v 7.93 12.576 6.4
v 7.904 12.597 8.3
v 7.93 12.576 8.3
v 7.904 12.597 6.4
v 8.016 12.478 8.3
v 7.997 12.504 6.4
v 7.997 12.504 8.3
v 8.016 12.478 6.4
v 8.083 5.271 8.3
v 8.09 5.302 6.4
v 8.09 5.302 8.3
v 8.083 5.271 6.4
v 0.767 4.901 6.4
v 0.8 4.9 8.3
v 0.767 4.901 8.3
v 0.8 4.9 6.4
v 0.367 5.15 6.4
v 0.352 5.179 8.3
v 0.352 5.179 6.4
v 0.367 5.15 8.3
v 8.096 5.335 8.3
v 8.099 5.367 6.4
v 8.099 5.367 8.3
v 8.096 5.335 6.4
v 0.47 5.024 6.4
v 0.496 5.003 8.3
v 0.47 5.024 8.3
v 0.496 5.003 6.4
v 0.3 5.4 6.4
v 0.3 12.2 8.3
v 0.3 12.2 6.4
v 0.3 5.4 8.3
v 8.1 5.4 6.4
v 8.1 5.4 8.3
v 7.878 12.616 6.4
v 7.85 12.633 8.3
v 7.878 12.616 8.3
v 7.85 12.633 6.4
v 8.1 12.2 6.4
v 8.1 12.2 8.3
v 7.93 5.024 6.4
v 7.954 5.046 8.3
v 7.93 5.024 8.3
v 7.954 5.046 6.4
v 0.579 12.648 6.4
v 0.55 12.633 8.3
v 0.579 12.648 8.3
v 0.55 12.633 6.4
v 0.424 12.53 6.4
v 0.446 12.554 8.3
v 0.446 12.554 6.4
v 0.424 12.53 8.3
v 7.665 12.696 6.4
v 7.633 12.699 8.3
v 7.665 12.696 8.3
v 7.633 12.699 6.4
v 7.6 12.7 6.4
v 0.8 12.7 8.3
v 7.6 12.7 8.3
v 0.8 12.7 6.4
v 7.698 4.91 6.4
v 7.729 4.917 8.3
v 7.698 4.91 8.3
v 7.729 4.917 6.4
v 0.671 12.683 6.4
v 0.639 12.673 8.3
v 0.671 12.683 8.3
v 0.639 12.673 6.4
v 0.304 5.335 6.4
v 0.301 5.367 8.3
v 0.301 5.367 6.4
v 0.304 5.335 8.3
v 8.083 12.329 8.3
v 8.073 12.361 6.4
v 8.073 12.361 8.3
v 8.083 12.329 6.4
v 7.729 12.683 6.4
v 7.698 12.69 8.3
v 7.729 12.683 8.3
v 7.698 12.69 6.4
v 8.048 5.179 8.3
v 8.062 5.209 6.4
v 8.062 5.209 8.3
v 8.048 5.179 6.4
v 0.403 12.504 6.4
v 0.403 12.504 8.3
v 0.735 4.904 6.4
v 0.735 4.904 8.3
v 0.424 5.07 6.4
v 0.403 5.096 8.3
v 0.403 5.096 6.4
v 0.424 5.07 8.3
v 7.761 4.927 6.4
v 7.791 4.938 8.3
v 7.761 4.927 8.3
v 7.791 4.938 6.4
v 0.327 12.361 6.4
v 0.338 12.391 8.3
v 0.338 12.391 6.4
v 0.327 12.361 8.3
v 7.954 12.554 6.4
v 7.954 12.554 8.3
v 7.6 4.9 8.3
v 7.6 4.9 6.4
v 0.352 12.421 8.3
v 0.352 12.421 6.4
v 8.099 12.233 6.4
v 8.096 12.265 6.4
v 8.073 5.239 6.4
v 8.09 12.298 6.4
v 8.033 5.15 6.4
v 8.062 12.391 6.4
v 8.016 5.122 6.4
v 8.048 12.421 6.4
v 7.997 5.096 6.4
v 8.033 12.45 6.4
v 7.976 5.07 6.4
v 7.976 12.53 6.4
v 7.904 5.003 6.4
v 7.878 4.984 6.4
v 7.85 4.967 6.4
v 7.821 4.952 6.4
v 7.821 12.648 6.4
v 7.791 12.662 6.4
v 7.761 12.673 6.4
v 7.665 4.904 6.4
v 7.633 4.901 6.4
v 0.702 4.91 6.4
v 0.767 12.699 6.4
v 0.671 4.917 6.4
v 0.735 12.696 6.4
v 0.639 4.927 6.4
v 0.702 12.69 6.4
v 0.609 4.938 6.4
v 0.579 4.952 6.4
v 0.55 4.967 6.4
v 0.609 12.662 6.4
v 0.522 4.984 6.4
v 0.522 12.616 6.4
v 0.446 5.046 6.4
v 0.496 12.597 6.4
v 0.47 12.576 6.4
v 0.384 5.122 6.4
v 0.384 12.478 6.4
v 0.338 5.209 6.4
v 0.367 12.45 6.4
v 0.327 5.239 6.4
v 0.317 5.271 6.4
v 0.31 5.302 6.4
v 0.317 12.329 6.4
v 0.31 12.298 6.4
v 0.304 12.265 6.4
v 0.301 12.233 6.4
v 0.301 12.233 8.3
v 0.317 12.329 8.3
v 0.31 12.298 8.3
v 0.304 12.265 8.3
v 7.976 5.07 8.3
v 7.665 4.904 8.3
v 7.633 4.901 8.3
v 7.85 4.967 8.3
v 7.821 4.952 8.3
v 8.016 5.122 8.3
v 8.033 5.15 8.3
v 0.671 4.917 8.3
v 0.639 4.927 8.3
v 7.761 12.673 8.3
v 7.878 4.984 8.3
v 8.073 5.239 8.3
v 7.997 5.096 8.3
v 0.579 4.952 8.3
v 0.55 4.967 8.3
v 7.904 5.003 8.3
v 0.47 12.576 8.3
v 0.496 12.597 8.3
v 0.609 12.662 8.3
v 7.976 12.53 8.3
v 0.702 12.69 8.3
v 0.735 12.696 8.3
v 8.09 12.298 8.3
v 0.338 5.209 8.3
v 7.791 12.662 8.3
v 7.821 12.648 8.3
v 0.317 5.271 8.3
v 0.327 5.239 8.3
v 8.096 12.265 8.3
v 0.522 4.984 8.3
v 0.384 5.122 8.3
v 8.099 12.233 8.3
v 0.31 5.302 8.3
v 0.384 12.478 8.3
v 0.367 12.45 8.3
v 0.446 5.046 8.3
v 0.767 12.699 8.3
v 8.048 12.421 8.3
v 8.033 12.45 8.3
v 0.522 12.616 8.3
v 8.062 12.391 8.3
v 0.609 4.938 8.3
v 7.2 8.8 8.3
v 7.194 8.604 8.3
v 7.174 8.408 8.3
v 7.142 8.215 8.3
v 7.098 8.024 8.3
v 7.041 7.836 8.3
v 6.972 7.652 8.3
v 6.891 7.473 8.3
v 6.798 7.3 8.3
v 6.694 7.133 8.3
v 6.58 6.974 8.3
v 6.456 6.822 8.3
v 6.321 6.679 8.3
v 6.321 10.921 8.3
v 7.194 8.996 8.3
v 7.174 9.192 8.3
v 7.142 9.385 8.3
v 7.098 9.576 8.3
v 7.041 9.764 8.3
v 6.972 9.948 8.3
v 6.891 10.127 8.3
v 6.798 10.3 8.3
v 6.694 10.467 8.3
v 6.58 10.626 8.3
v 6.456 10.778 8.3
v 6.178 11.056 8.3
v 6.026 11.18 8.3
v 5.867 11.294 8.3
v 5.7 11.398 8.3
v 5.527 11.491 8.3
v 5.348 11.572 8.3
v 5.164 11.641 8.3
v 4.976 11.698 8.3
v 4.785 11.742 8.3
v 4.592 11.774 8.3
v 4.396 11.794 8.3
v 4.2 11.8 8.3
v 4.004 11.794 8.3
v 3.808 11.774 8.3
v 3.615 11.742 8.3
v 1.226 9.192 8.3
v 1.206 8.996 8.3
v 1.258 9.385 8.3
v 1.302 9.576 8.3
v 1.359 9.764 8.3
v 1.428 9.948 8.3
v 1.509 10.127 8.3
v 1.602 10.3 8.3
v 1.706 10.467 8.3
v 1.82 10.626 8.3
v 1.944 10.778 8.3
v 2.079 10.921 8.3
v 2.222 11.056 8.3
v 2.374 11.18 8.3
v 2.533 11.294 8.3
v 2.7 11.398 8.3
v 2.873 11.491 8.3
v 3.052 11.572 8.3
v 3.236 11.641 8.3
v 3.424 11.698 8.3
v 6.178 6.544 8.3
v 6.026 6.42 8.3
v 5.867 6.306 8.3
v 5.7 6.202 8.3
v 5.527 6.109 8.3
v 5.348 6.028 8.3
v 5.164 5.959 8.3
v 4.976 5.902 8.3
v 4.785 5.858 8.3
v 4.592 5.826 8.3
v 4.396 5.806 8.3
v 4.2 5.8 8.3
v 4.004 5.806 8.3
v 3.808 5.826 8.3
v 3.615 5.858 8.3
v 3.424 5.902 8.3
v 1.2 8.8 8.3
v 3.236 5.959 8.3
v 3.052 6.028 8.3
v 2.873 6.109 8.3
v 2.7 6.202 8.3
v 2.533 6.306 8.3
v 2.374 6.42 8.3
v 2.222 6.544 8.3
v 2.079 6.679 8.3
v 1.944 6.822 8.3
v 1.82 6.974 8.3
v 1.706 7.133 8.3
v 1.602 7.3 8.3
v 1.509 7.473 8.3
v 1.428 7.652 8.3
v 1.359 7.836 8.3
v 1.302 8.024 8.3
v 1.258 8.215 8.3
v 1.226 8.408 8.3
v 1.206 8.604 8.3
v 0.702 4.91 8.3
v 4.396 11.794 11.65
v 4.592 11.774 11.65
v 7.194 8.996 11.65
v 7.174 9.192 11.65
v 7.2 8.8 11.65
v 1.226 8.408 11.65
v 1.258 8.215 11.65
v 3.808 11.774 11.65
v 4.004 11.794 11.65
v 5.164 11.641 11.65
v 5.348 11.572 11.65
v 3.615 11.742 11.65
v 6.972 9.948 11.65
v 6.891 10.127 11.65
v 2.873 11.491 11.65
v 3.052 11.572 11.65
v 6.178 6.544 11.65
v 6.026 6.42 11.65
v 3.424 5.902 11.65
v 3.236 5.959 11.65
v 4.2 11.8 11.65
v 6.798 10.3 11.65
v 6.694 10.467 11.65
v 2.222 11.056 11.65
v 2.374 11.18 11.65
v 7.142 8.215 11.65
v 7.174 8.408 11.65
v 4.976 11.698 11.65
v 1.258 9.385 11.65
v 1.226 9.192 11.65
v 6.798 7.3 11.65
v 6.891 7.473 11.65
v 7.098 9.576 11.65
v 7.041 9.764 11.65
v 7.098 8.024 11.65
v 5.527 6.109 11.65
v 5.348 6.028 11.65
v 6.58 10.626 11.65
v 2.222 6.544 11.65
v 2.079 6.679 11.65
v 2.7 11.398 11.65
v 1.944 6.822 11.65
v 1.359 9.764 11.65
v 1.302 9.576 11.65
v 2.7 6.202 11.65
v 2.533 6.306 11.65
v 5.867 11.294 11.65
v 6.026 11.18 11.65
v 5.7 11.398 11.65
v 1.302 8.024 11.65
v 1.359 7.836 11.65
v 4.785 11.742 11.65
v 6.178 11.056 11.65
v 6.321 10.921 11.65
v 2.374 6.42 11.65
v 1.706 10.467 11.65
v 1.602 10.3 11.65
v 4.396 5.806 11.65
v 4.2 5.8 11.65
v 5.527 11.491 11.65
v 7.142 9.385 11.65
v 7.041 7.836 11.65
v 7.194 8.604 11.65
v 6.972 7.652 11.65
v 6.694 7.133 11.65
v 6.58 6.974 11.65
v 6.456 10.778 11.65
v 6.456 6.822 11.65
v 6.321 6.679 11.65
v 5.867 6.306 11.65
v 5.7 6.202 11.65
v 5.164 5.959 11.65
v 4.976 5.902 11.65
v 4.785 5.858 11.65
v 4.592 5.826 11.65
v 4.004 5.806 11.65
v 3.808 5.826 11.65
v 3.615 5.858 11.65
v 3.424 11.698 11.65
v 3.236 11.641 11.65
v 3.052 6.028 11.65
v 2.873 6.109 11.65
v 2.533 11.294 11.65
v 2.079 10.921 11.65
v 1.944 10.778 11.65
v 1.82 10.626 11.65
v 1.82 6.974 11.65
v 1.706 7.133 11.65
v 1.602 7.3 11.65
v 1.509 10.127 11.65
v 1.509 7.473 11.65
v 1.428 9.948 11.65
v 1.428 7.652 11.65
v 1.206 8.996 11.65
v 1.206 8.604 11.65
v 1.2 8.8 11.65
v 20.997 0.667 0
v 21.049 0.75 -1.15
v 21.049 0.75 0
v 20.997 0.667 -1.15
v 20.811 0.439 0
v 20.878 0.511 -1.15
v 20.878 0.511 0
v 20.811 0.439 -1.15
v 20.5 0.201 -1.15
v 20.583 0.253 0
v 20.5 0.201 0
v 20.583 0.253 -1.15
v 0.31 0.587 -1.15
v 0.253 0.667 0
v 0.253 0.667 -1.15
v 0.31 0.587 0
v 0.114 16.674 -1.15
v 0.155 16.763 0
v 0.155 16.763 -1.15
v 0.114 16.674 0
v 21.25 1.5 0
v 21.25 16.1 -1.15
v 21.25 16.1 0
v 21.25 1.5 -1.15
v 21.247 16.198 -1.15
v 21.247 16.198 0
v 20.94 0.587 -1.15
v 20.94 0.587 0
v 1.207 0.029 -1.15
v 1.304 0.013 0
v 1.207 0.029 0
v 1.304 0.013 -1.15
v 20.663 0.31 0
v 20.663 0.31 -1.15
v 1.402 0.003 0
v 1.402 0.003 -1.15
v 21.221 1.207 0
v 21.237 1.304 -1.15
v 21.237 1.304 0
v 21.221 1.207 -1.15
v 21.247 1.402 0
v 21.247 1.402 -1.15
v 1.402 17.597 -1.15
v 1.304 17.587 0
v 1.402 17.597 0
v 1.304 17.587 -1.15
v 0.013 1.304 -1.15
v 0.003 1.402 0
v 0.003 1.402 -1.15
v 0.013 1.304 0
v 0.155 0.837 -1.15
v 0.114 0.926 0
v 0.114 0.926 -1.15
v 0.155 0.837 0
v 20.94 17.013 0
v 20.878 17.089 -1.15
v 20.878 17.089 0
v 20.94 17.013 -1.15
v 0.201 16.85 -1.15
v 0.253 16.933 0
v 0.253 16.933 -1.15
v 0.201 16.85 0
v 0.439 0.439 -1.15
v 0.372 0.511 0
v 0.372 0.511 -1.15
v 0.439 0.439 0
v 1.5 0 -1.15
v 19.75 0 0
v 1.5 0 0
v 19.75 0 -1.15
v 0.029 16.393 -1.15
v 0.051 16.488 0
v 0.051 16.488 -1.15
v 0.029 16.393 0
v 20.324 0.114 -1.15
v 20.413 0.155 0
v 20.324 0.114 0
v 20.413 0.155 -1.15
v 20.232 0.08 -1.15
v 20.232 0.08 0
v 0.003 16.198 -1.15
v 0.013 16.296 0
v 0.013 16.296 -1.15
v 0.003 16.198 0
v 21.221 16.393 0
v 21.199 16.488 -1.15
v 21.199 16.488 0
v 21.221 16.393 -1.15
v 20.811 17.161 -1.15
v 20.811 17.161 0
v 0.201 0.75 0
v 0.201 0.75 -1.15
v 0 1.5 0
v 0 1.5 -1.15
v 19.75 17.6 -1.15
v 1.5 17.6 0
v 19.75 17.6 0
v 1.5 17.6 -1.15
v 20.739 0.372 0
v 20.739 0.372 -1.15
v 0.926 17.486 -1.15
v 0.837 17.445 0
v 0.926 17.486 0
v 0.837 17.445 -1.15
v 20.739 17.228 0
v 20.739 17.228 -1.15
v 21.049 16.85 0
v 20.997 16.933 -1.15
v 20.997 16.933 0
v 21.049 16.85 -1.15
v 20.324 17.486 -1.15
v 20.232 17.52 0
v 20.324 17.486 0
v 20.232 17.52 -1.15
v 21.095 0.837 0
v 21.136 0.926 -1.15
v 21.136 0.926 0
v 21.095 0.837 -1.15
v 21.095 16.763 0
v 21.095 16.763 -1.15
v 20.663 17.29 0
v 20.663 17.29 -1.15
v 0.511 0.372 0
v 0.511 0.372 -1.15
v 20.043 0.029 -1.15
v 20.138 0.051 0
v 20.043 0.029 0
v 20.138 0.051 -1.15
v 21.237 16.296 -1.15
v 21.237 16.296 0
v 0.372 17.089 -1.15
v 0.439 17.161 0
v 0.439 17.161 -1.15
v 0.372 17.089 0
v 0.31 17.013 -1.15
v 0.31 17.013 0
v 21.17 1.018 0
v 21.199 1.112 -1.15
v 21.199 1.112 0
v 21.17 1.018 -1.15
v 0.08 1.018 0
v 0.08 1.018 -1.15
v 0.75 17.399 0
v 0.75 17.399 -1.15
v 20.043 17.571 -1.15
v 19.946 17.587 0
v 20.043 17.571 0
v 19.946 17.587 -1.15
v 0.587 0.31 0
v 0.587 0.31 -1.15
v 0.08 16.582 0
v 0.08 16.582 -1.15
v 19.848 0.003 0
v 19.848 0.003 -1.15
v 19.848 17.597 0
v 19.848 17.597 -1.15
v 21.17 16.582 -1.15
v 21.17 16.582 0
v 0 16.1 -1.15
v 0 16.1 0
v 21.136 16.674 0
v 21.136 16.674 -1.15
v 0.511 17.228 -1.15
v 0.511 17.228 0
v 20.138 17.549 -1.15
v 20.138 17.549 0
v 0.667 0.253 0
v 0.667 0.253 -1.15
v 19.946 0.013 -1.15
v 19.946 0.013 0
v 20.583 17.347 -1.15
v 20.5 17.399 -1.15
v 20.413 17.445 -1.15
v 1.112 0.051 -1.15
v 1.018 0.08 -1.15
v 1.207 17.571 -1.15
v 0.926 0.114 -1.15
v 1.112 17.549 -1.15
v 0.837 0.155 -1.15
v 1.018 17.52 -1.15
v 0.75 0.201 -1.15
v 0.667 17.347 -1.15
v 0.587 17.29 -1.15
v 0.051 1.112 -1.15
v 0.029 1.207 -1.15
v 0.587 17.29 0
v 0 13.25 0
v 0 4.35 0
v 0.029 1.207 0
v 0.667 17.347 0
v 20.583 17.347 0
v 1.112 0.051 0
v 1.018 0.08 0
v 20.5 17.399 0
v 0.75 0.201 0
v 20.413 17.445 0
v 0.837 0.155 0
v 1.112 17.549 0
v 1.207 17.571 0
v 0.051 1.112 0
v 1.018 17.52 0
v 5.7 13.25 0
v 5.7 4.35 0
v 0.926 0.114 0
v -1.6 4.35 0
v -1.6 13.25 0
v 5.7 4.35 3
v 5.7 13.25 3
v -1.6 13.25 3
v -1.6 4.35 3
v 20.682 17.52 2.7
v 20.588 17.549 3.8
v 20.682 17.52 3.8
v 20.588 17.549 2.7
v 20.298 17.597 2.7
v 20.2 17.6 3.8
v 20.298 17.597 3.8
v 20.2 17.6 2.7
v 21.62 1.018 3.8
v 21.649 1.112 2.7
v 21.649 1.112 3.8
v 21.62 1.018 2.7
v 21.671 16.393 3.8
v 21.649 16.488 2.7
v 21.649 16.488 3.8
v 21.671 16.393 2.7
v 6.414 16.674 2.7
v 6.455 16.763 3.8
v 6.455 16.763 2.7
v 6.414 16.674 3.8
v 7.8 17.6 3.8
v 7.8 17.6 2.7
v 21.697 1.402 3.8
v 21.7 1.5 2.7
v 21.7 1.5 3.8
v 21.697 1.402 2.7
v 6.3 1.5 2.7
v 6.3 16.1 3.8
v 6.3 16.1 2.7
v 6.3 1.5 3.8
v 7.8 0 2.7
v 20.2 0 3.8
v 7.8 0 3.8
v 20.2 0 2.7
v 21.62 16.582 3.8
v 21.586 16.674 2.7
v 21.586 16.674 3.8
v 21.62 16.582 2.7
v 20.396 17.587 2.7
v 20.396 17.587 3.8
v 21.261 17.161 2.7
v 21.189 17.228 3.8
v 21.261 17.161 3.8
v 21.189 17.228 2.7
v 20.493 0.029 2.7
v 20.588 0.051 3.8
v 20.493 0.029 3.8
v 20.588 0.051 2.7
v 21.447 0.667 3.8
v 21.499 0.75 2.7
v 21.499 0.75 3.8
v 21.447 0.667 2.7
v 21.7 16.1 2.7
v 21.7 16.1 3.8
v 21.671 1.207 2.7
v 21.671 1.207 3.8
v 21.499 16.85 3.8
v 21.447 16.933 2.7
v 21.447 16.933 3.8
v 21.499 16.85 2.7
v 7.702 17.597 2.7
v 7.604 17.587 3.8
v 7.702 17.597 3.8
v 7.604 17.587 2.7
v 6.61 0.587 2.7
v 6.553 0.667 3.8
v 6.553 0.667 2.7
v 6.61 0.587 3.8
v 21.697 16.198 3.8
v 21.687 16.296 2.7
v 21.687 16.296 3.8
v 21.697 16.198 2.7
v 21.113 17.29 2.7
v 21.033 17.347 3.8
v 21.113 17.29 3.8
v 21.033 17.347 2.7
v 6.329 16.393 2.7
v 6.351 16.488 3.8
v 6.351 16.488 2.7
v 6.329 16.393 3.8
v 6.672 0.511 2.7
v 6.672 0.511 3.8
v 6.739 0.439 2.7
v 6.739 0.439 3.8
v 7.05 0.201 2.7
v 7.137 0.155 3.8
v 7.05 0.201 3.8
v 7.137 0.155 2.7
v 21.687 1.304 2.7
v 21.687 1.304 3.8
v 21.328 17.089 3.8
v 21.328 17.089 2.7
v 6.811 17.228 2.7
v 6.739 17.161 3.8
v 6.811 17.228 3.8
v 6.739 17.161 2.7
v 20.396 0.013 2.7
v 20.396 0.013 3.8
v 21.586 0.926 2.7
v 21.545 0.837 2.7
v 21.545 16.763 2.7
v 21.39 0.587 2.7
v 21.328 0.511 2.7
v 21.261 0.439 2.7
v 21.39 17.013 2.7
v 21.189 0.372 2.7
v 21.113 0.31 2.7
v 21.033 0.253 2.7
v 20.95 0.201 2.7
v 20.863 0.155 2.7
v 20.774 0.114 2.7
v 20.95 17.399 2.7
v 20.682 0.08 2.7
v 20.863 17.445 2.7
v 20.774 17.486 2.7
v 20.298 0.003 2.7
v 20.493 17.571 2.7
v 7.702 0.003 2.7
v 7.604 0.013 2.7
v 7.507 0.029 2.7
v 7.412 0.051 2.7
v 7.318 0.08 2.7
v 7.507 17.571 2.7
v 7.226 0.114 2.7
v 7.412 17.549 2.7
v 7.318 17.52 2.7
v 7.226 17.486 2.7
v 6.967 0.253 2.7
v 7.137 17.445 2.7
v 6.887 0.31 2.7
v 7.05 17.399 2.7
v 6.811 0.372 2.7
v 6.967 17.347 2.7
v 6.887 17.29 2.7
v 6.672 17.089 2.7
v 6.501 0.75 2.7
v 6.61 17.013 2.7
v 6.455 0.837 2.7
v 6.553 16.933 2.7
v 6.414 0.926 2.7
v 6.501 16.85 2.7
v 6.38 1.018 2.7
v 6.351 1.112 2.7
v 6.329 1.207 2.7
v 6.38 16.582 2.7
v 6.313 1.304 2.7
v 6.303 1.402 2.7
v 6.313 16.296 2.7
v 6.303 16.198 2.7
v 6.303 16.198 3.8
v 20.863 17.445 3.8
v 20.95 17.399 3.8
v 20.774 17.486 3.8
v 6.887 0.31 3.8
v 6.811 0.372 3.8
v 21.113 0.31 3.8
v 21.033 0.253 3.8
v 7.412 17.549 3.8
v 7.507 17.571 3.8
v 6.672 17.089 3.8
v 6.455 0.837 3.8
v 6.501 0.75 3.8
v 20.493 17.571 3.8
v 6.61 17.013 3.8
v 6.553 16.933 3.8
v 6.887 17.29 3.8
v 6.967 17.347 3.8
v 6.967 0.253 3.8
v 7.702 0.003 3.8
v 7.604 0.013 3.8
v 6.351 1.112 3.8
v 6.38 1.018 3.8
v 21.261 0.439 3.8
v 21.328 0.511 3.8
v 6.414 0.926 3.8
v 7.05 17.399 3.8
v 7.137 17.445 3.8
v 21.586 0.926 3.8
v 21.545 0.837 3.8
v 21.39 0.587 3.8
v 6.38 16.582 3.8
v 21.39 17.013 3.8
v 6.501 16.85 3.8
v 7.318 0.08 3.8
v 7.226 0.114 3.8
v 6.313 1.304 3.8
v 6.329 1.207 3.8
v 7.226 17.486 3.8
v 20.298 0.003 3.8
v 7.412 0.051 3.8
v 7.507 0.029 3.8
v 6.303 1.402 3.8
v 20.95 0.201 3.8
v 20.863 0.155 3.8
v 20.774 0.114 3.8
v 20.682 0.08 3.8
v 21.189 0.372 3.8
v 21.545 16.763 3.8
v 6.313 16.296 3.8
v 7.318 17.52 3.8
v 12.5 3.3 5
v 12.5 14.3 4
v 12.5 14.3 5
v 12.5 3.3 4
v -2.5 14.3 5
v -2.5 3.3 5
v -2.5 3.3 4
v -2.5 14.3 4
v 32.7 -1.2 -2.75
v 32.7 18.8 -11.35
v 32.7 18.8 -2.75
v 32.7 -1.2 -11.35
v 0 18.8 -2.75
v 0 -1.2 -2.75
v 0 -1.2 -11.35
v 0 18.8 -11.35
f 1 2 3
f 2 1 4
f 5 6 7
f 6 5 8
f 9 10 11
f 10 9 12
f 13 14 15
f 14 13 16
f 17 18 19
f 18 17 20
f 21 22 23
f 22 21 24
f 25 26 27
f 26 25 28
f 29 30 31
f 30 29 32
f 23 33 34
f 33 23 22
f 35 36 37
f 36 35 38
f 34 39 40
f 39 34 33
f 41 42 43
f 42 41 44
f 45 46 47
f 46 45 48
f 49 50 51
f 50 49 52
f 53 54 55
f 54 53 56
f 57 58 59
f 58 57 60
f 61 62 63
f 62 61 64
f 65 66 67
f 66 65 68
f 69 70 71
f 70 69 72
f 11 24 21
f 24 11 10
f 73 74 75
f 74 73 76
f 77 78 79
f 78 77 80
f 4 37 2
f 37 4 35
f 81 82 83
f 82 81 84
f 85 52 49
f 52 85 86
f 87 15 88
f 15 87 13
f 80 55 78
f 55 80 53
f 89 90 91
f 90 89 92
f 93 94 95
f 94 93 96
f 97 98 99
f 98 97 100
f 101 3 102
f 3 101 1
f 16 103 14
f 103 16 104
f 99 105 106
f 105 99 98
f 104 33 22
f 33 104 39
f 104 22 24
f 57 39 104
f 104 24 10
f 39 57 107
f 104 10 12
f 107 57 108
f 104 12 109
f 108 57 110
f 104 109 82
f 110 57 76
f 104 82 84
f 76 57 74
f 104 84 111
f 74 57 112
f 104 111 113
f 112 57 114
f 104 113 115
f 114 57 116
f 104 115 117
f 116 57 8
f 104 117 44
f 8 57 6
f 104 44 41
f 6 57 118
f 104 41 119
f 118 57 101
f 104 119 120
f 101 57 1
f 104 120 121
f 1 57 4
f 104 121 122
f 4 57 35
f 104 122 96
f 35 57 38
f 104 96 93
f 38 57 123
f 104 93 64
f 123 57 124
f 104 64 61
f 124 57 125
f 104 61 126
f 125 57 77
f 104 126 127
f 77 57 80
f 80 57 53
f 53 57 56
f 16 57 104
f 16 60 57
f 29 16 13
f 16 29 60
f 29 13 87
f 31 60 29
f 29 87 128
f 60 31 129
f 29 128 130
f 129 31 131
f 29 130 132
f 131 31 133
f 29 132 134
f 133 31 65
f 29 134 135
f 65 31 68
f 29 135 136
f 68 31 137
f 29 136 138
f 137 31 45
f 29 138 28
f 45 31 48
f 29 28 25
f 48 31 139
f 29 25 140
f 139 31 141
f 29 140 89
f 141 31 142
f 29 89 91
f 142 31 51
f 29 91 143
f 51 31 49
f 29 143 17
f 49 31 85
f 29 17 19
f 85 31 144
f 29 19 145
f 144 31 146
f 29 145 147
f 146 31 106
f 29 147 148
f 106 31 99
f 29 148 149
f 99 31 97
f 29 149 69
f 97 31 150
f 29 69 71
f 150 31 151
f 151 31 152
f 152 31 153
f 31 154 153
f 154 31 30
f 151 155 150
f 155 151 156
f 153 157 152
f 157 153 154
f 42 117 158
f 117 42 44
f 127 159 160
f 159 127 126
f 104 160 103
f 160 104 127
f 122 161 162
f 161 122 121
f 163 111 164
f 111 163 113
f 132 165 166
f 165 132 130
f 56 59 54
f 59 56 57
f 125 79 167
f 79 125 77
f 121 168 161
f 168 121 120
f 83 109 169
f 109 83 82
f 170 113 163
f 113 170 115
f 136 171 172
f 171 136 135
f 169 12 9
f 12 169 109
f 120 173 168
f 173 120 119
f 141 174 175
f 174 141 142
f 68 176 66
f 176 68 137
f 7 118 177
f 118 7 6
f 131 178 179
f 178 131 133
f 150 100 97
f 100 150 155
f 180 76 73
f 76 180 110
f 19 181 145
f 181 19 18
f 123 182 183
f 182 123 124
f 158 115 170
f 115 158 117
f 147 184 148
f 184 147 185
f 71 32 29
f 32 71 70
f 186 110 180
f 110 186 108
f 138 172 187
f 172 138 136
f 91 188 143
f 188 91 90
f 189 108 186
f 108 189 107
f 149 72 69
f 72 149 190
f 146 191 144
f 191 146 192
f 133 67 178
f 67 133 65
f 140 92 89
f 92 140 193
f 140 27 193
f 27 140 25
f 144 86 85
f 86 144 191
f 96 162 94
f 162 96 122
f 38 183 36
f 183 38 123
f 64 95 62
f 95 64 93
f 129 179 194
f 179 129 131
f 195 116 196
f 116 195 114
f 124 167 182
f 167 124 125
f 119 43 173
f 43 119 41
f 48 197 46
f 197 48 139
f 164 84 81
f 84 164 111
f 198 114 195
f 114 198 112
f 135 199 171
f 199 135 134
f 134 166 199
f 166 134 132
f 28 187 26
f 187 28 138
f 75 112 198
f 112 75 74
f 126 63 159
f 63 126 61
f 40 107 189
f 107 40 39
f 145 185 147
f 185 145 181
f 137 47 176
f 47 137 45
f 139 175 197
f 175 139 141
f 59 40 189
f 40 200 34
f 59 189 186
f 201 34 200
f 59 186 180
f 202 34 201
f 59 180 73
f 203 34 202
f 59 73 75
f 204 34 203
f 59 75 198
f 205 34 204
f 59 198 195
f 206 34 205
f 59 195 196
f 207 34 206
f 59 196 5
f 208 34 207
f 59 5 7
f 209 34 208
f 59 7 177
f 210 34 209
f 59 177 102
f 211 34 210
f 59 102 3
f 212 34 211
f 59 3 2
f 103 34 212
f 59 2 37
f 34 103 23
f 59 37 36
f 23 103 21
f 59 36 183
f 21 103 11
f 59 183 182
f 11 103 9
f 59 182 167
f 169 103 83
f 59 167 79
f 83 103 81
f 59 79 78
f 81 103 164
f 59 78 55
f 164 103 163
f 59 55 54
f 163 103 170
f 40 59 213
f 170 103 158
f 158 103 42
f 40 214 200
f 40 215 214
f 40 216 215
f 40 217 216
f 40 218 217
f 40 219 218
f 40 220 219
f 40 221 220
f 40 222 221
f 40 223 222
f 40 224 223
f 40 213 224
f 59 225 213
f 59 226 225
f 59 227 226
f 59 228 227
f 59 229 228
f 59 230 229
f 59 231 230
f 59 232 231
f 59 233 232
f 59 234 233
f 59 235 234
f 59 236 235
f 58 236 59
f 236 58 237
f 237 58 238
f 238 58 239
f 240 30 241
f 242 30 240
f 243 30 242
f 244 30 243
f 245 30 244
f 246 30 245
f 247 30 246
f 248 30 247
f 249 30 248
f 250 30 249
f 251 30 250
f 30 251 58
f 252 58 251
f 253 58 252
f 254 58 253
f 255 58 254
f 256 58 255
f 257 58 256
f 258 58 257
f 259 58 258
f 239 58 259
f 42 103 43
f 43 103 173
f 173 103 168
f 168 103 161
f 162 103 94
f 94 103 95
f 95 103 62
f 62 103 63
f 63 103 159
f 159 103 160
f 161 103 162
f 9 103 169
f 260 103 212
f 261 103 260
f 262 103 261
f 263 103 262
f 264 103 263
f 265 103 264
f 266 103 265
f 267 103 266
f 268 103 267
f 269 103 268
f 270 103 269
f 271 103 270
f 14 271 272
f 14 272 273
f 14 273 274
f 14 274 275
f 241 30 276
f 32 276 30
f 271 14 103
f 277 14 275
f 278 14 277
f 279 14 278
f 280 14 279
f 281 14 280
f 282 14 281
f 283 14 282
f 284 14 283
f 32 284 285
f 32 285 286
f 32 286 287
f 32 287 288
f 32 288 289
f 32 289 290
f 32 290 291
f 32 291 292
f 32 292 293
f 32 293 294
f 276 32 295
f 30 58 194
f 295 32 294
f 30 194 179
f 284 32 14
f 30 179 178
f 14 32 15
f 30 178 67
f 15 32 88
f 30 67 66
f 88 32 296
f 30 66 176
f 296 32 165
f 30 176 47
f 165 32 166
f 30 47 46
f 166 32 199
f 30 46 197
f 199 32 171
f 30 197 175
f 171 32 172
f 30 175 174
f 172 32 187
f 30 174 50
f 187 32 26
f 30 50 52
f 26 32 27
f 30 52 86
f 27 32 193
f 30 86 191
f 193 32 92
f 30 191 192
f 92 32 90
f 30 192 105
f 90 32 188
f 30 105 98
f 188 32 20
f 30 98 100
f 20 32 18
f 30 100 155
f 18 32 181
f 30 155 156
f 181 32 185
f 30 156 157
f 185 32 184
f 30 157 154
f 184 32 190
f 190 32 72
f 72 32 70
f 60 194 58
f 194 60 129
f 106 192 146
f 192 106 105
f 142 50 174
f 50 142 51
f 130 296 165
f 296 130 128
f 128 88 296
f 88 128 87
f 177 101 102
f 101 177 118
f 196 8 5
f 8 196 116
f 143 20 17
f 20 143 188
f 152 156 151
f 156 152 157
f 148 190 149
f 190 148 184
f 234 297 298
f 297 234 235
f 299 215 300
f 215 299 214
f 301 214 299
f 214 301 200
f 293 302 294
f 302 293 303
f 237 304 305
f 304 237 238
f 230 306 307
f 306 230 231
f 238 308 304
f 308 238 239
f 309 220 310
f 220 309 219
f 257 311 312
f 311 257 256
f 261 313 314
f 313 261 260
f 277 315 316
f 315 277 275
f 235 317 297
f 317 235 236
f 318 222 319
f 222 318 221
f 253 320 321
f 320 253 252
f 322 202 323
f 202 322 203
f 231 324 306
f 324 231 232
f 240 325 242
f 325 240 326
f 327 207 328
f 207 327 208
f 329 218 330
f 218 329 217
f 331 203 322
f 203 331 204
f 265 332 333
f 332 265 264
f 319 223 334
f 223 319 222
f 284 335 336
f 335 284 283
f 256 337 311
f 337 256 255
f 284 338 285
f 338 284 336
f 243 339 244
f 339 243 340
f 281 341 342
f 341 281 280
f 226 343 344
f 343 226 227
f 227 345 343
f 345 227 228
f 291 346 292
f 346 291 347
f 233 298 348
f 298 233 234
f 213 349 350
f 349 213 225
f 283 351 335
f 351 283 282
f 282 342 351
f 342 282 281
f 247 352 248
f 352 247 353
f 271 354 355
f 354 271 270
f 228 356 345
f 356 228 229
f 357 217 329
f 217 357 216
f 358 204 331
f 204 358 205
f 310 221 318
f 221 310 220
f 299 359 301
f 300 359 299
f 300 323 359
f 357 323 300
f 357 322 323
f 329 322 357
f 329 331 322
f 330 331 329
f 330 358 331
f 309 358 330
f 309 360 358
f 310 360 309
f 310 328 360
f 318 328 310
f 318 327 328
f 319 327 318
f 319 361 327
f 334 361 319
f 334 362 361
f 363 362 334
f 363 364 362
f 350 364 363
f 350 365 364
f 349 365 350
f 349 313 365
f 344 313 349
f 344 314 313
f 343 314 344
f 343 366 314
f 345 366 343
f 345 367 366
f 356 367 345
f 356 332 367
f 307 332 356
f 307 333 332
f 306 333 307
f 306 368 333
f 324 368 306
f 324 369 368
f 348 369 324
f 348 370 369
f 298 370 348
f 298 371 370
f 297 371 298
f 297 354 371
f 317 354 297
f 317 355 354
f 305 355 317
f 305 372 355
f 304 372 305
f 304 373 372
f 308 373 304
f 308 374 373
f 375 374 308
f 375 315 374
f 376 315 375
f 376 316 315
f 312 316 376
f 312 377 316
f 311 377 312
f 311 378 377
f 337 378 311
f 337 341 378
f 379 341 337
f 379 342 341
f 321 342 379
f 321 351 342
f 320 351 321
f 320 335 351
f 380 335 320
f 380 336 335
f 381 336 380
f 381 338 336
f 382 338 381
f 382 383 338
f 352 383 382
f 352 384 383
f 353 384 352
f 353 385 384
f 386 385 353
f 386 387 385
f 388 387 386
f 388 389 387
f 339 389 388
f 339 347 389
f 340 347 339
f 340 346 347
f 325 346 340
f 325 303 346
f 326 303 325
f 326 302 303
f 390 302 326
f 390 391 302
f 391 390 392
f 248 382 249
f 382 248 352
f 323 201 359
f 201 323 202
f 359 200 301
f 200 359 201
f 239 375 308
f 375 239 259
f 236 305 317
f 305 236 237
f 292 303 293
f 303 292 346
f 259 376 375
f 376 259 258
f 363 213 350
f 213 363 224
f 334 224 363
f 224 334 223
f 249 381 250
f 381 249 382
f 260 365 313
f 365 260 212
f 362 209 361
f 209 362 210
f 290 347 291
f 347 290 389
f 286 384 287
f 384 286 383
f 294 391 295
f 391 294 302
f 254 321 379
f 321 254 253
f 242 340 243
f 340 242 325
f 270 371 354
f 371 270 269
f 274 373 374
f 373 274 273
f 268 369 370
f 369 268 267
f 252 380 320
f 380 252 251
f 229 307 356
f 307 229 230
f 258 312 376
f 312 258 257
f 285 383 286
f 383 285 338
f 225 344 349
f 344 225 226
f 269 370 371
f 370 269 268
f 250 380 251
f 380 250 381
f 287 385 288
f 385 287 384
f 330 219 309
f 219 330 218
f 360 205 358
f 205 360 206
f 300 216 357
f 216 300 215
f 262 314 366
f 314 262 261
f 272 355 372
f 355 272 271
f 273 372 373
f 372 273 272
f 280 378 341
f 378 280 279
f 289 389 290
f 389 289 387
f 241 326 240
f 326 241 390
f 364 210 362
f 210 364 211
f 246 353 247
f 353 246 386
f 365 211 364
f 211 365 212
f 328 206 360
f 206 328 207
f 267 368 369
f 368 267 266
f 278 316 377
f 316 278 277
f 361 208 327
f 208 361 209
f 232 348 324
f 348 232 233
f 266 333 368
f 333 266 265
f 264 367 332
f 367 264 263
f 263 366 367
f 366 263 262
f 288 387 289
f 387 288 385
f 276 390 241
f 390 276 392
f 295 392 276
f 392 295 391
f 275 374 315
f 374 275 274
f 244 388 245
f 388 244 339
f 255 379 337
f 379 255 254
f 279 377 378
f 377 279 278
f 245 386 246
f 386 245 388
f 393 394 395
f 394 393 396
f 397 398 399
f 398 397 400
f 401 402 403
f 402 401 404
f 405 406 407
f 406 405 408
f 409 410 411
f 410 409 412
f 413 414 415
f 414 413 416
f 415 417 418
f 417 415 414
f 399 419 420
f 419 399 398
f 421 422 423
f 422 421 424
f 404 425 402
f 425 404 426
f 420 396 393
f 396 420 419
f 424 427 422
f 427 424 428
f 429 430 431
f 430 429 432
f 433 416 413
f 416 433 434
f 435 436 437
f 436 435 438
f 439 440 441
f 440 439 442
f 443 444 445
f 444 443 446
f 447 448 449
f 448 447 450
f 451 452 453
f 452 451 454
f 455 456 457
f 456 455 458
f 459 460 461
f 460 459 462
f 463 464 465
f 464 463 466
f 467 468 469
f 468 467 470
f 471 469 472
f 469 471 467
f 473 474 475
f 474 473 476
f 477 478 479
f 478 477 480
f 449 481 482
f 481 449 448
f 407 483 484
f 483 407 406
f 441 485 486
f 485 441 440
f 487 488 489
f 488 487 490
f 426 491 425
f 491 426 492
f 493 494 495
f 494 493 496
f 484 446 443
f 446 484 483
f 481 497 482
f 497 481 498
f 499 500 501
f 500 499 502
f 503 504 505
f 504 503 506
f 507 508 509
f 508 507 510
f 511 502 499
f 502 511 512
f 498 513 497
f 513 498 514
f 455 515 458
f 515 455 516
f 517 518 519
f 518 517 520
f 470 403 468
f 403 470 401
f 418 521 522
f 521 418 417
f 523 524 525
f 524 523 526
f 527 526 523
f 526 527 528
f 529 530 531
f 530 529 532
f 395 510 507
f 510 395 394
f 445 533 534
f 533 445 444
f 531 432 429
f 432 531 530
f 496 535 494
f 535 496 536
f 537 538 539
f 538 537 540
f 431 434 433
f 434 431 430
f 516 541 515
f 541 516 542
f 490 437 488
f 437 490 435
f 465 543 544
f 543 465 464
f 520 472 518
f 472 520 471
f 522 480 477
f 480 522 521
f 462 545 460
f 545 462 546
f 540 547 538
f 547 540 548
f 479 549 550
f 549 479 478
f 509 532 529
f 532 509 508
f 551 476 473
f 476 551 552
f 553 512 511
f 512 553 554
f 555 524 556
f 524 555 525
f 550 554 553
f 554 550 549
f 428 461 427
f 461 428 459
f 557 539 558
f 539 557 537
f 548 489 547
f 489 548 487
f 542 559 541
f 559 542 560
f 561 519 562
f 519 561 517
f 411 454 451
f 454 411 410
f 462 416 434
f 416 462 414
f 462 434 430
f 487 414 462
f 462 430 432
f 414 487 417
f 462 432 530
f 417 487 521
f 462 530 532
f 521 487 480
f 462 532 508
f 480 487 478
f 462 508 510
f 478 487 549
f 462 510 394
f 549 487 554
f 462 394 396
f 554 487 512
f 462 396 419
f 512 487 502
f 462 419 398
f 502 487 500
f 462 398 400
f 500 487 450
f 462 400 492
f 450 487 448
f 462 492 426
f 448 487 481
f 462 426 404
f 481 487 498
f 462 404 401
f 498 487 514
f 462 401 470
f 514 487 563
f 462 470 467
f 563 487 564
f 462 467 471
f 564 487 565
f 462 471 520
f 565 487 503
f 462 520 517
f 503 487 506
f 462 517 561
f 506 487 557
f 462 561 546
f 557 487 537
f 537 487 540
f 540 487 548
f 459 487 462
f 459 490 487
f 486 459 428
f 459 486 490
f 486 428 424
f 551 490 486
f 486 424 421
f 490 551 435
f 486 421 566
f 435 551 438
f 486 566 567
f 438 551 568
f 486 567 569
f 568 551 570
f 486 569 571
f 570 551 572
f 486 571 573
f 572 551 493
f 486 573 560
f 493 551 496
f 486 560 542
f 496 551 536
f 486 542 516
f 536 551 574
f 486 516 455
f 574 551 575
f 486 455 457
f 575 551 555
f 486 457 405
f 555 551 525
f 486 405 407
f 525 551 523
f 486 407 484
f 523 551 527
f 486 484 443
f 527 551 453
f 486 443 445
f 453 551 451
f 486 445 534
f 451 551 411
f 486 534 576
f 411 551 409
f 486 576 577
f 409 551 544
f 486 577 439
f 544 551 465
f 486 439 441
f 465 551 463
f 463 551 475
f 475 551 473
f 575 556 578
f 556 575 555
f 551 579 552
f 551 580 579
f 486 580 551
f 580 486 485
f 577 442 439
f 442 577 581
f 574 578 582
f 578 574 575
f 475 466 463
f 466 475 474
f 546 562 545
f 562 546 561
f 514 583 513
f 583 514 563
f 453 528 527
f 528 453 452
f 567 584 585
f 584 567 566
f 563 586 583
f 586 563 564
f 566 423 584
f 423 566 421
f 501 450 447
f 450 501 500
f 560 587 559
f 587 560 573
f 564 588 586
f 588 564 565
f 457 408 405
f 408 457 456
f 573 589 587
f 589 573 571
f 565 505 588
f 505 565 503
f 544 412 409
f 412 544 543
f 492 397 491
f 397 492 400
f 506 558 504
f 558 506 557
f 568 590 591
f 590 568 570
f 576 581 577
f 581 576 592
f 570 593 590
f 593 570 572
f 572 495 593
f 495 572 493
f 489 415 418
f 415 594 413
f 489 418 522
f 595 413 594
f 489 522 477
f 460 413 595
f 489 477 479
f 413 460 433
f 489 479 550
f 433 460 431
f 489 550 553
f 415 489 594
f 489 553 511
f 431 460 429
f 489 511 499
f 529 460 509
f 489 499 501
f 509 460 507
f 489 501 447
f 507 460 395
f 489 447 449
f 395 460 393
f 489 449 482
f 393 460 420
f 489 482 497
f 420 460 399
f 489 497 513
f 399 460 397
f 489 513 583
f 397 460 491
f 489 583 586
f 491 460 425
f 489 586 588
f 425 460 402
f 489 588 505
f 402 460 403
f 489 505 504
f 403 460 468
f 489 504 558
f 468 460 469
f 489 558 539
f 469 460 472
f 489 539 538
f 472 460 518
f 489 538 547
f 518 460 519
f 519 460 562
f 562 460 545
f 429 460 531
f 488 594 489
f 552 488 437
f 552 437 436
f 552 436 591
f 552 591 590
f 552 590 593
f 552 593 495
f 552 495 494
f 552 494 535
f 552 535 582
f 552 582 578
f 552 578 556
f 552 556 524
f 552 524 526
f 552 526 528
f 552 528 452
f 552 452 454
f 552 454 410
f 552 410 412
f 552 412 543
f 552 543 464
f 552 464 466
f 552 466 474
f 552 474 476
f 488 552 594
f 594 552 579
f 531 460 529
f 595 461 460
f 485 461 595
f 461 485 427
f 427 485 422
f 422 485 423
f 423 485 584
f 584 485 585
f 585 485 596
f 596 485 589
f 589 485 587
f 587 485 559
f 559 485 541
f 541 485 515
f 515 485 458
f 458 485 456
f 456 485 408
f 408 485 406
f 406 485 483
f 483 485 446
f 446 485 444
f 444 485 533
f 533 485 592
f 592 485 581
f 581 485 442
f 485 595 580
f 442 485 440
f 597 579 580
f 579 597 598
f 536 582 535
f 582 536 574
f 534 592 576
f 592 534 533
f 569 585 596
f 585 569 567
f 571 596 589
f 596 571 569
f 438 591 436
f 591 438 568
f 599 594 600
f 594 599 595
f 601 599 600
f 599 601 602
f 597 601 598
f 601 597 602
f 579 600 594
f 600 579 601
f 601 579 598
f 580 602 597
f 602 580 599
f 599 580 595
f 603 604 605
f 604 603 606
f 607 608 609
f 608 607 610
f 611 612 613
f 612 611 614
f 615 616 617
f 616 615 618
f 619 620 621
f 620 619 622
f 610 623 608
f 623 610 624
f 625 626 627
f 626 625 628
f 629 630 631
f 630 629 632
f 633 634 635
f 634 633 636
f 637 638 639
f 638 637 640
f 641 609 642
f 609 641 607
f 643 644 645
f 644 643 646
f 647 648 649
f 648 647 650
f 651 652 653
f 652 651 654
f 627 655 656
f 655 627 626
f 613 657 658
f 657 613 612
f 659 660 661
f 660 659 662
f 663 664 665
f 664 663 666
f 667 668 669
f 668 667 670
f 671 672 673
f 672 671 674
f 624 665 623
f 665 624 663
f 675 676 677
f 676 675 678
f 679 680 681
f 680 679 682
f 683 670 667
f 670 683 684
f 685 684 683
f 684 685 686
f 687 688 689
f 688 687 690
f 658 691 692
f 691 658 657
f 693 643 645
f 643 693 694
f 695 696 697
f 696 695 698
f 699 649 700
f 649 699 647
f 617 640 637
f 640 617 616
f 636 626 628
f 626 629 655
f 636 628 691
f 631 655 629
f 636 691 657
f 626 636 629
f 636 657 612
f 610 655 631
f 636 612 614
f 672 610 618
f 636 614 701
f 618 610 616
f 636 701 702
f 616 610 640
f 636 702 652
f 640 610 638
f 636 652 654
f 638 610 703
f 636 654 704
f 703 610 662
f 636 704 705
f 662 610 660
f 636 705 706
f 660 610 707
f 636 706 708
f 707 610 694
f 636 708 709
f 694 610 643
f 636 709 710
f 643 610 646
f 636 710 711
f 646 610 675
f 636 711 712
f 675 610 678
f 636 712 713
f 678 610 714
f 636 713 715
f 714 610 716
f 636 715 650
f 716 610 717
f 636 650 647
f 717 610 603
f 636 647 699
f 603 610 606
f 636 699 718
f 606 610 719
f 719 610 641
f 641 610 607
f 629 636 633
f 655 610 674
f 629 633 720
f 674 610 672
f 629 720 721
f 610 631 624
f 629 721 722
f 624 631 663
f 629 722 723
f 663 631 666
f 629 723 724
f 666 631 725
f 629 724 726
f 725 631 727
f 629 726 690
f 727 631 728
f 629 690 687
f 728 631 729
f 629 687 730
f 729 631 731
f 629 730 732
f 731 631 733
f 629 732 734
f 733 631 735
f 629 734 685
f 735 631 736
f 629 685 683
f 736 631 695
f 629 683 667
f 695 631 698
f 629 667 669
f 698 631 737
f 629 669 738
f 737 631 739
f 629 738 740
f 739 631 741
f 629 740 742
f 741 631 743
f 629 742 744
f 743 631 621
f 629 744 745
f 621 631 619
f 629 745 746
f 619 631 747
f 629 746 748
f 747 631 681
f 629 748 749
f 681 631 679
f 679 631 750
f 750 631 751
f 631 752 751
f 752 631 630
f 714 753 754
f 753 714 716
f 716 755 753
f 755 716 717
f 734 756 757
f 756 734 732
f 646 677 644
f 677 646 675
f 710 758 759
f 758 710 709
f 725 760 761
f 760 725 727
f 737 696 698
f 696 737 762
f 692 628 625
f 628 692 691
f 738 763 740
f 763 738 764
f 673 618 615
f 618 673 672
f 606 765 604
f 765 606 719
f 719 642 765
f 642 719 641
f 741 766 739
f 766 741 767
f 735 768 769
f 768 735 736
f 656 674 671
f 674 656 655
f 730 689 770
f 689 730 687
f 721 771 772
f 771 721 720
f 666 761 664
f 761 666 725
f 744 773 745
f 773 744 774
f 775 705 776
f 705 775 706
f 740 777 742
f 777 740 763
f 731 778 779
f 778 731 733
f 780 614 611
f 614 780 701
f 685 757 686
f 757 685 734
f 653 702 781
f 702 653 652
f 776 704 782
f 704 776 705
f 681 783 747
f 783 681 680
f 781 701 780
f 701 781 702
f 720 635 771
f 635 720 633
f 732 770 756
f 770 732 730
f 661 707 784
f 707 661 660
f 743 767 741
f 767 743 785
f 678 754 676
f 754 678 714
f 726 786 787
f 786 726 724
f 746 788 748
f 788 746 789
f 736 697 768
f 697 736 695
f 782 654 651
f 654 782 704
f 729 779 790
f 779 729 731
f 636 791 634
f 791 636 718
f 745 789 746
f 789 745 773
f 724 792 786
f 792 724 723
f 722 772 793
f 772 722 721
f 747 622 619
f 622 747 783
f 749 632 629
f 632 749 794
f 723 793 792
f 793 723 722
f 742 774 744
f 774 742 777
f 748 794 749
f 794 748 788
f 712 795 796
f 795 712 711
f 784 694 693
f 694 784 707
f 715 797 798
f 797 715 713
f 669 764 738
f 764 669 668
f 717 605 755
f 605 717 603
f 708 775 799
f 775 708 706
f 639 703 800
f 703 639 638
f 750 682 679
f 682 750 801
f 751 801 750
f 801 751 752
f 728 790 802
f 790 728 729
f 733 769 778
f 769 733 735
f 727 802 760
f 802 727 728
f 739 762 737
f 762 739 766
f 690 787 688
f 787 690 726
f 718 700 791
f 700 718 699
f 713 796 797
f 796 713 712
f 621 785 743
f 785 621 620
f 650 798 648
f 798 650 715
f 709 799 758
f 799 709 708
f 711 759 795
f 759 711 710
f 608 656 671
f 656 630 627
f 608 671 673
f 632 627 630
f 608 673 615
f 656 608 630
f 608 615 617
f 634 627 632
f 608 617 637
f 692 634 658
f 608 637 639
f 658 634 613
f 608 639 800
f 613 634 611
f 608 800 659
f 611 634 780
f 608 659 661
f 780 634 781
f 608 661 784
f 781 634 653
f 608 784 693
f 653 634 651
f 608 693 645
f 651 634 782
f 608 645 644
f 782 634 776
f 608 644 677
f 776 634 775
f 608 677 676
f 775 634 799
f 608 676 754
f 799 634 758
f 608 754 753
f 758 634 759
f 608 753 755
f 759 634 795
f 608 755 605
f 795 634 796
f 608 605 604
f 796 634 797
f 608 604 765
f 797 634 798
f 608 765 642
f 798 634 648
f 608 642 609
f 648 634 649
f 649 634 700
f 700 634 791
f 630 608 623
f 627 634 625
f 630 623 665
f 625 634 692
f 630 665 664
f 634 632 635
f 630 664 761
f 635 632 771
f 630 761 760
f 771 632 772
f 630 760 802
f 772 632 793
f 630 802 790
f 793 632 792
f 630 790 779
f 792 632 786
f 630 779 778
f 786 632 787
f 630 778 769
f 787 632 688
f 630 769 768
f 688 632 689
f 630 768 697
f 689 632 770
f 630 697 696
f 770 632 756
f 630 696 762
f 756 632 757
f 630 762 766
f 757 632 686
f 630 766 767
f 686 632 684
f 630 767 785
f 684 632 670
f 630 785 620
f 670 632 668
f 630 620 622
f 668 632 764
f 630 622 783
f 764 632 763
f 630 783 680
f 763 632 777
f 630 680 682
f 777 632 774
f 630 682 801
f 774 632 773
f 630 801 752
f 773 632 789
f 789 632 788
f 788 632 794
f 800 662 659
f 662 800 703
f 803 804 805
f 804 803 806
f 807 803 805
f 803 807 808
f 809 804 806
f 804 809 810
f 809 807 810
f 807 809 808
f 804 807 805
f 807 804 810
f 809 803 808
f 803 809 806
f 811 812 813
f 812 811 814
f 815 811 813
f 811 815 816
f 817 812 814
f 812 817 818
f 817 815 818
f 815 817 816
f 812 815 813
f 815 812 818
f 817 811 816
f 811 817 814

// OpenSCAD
// file: params.scad
// envsense クリップ筐体 — パラメータ定義 (Phase 1 / #2)
//
// 値の単一ソースは dimensions.md。ここの「実測値」変数名は dimensions.md の
// 「OpenSCAD 変数名」列と完全一致させること（hardware/CLAUDE.md の規約）。
//
// 座標系（dimensions.md の規約に準拠）:
//   原点  = XIAO メイン基板の USB-C 側短辺の角
//   +X    = 基板長手方向（USB-C 端 → 反対端）, 0..board_l
//   +Y    = 基板幅方向, 0..board_w
//   +Z    = 厚み方向。z=0 はメイン基板の上面（USB-C 側）。
//           +Z = 上面（USB-C 側）/ -Z = 下面（Sense 拡張ボード・カメラ側）
//
// 「実測値」と「はめ合い後の値(_fit)」は分離する。実測は素のまま、
// クリアランスはここで足す（dimensions.md の測定ルール）。

// ===== 1. XIAO ESP32S3 メイン基板（実測値） =====
board_l      = 21.25;   // 基板 長さ
board_w      = 17.6;    // 基板 幅
pcb_t        = 1.15;    // PCB 厚み
corner_r     = 1.5;     // 角 R
usb_overhang = 1.6;     // USB-C コネクタの基板からの飛び出し（実測; 全長7.3 - 載り5.7。旧0.85を置換）
usb_w        = 8.9;     // USB-C コネクタ 幅
usb_h        = 3.0;     // USB-C コネクタ 高さ（筐体内 最高部品）
usb_open_w   = 8.3;     // USB-C 開口 幅（受け口 実測）
usb_open_h   = 2.5;     // USB-C 開口 高さ（受け口 実測）
usb_z        = 0.2;     // USB-C 開口 下端の基板上面からの高さ
top_clr      = 3.0;     // 上面 最大部品高さ（= usb_h）
pin_pitch    = 2.54;    // ピン ピッチ（規格）

// ===== 2. Sense 拡張ボード（実測値, ローカル原点） =====
sense_l     = 15.4;     // 外形 長さ
sense_w     = 17.6;     // 外形 幅
sense_t     = 1.1;      // PCB 厚み
b2b_gap     = 2.7;      // B2B コネクタ高さ（基板間の隙間）
mic_xy      = [6.6, 2]; // PDM マイク穴 位置（拡張ボード ローカル）
cam_fpc_xy  = [8.8, 9]; // カメラ FPC コネクタ 位置（拡張ボード ローカル）
sd_protrude = 2.5;      // SD カード挿入時の頭(-X)突き出し: 先端 x = -2.5（基板頭 x=0 基準, 実測）
                        //   旧記載「埋め込み式 0」は誤り。USB 前面(x=-1.6)よりさらに 0.9mm 出る

// ===== 3. 合体状態（実測値） =====
assy_h      = 7.8;          // 合体時 総厚（カメラ除く）
assy_offset = [6.3, 0];     // 拡張ボードの主基板に対するズレ X/Y

// ===== 4. OV3660 カメラモジュール（実測値） =====
cam_l    = 7.8;             // カメラ基板 長さ
cam_w    = 7.8;             // カメラ基板 幅
cam_t    = 1.9;             // カメラ基板 厚み
lens_d   = 6;               // レンズホルダー外径（= 前面レンズ穴径の基準）
lens_h   = 3.35;            // レンズホルダー突き出し高さ
lens_xy  = [3.9, 3.9];      // レンズ光軸（カメラ基板中心からのオフセット）
fpc_w    = 6;               // FPC 幅
fpc_l    = 8.7;             // FPC 長さ

// ===== 5. バッテリー（実測値） =====
bat_l       = 32.7;         // セル本体 長さ（基板長 21.25 より長い → レイアウト注意）
bat_w       = 20;           // セル本体 幅
bat_t       = 7.6;          // セル本体 厚み（最厚部）
bat_pcm_l   = 6.6;          // PCM 張り出し
bat_wire_d  = 0.7;          // リード線 線径

// =====================================================================
// 設計パラメータ（はめ合い・壁厚・造形）— ここを OEM のプロセスに合わせて調整
// =====================================================================

// 造形プロセス別の既定値の目安:
//   FDM      : wall 1.6 / clr 0.3
//   SLA/MJF  : wall 1.0 / clr 0.15
clr        = 0.3;   // 部品まわりの一般クリアランス（片側）
wall       = 1.6;   // 一般壁厚
wall_touch = 1.6;   // タッチ面（カメラ側 = 下面）の壁厚。静電容量が抜けるよう 1.5–2.0
lip_h      = 2.0;   // 本体/蓋の合わせ目リップ（印籠）の高さ
lip_t      = 1.0;   // リップの厚み
lip_clr    = 0.30;  // リップのはめ合いクリアランス（FDM 実機で 0.15 はきつく溝縁が変形 → 一般 clr と同値に）

// ===== 基板リテンション（4隅クランプ）=====
// 実測: メイン基板の4隅とも部品なしマージン 1.8mm（角は corner_r の R）。
//   Sense 拡張ボードには余白が無いので一切触れない。後(Sense側)2隅の上押さえは
//   B2B 隙間(b2b_gap)内に収め、メイン基板の上面(z=0)だけを押さえる
//   （Sense 下面 z_sense_bot=b2b_gap には当てない）。
//   基板はバッテリー基準のキャビティより小さく宙に浮くので、隅クレードルが
//   Z 受け（棚）と XY 位置決め（角の R を clr 付きで抱く）を兼ねる。
board_keepout = 1.8;   // 実測: 4隅の部品なしマージン（参考・チェック用）
clamp_reach   = 1.0;   // 基板縁への被さり量。clamp_reach + clr < board_keepout を守る
clamp_run     = 2.5;   // 角から各辺に沿うグリップ長さ（USB/カメラ等を避ける範囲）
shelf_t       = 0.8;   // 下受け棚の厚み(z)。bat_gap 以下に収める
top_h_front   = 2.5;   // 前(USB側)2隅の上押さえ高さ。上方が空くので高め可
// 後(Sense側)2隅の上押さえは廃止（旧 top_h_rear）: Sense が主基板尾を全幅で覆い、
//   蓋の垂直降下で Sense 上面に衝突して閉じられないため。浮き上がりは tail_backstop
//   のひさしで制限する（enclosure.scad の corner_grips / tail_backstop 参照）。
board_top_gap = 0.5;   // 押さえ爪を上へ平行移動する量＝基板上面との隙間（爪厚 top_h は維持）。
                       //   後隅の爪は廃止済みなので実質前(USB側)2隅のみに効く
weld          = 0.6;   // グリップを壁へ食い込ませる溶着代（union 確実化）
// 尾(+X)バックストップ: トップ半身所属の「天井吊り片持ちリブ ×2」（enclosure.scad の
//   tail_backstop 参照）。蓋を伏せて印刷したとき天井面から立ち上がる＝宙に浮く層が出ない。
//   中央開放が配線/アンテナの通り道とタッチ電極ポケット（pebble: cav_cy±6）の回避を兼ねる。
backstop_seg_w = 3.5;  // 各リブの幅(Y)。内側端がタッチ電極ポケット縁まで 0.5 残る上限
backstop_t     = 3.6;  // リブの厚み(X)。天井からの片持ちなので厚めに取って剛性確保

// はめ合い後の値（実測 + 余裕）
bat_t_fit  = bat_t + 1.0;   // バッテリー厚みは膨張ぶん +1mm（dimensions.md ルール）

// 部品配置の前提（要確認の設計判断 — 下記 TODO 参照）
// BAT パッド(基板裏=電池側)の半田＋リード線が電池に当たらないクリア。半田の山~1mm＋線ぶん。
bat_lead_clr = 1.6;   // 配線(半田＋細線)のための基板下面クリア
// 基板下面とバッテリー上面の仕切り。下受け棚(shelf_t)と配線クリア(bat_lead_clr)の大きい方。
bat_gap    = max(shelf_t + 0.2, bat_lead_clr);
// バッテリーは基板の下(-Z)に積層。bat_l=32.7 が基板長 21.25 より長いので
//   「頭合わせ」: バッテリー頭を基板頭(x=0)に揃え、尾(+X)へはみ出させる（#layout 決定）。
bat_x0     = 0;                    // バッテリー頭の x（基板頭に合わせる）
bat_y0     = board_w / 2 - bat_w / 2;  // 幅は中心合わせ
bat_off    = [0, 0];              // バッテリーの XY 微調整（bat_x0/bat_y0 基準）

// ===== Phase 1 追加計測（dimensions.md §7。実測で ASSUMED → MEASURED へ） =====
// 【画像準拠の修正】カメラは折り返した FPC で「上面(+Z)」に立ち、レンズは +Z（真上）へ。
//   位置は USB 端寄りで端をオーバーハング。FPC コネクタは逆端(遠端)。センサ = OV3660。
lens_axis    = [4.2, board_w / 2];                                    // MEASURED→実機補正: X=4.2(2.2から尾側(+X)へ2.0mm。実機で窓が頭側にずれていた。履歴: 3.5→2.2→4.2) / Y=幅中央
cam_org      = [lens_axis[0] - lens_xy[0], lens_axis[1] - lens_xy[1]]; // レンズ = カメラ基板中心
cam_base_z   = usb_h + 3.4;   // MEASURED: USB 上面(usb_h) から +3.4（USB上面→カメラ下面）
lens_front_d = 4.5;   // ASSUMED: レンズ前玉 有効径（開口・面取りの基準, < lens_d=6）
cam_fov      = 110;   // ASSUMED: OV3660 広角変種と推定(候補 64°/110°)。突出方式でケラレ影響は小
// マイク（試作は素の開口。防水メンブレンは後フェーズ）。部品面(+Z)に開口と仮定。
mic_pos       = [12.9, 3.0];   // MEASURED: X=12.9(長手,サブボード上) / Y=3.0(幅,端寄り)。X/Y入替を反映
mic_port_face = "top";     // ASSUMED: 部品面(+Z)に音孔。§7 で確定
mic_port_d    = 1.8;       // 試作の素開口径（1.0 は小さすぎ → 集音のため拡大）
// 干渉
usb_body_l = 5.7;     // MEASURED: USB端→コネクタ本体内側端

// ===== 派生：Z レイヤ（parts と enclosure で共有） =====
// 積層（上→下）: 上部壁 / カメラ / サブ基板(Sense) / メイン基板(XIAO) / バッテリー / 下部壁
// z=0 = メイン基板 上面（サブ基板を向く面）。+Z = 上（カメラ側） / -Z = 下（バッテリー側）
z_board_top = 0;                    // メイン基板 上面
z_board_bot = z_board_top - pcb_t;  // メイン基板 下面
// サブ基板(Sense) はメイン基板の上(+Z)、B2B 隙間ぶん持ち上がる
z_sense_bot = z_board_top + b2b_gap;
z_sense_top = z_sense_bot + sense_t;
// バッテリーはメイン基板の下(-Z)
z_bat_top   = z_board_bot - bat_gap;
z_bat_bot   = z_bat_top - bat_t_fit;
// 上面(+Z): カメラ（サブ基板の上に立つ）と USB コネクタ
z_usb_top   = z_board_top + usb_h;
z_cam_top   = cam_base_z + cam_t;   // カメラ基板 上面
z_lens_top  = z_cam_top + lens_h;   // レンズ先端（+Z 最高点）= 天面壁を貫通して突出

// ===== microSD カード（Sense 部品面(+Z)上のスロット。頭(-X)へ突き出す） =====
// スロットケージは Sense 拡張ボードの部品面(+Z)上（実機写真・Seeed wiki 写真で確認）。
// カードは USB 上面(z=3.0)とカメラ底(z=6.4)の間を通り、先端が x=-sd_protrude まで届いて
// 頭壁内面(cav_x0=-1.9)を 0.6mm 貫く → 頭壁に逃しが必要（enclosure の cut_sd / cut_sd_peb）。
sd_card_l = 15;    // カード規格 長さ
sd_card_w = 11;    // カード規格 幅
sd_card_t = 1.0;   // カード規格 厚み（リブ部最大）
sd_z0     = z_sense_top + 0.2;              // ASSUMED: カード下面 = Sense 上面 + ケージ床 0.2
sd_y0     = board_w / 2 - sd_card_w / 2;    // ASSUMED: 幅中央（実機写真でほぼ中央）
sd_clr_y  = 1.0;   // 逃し開口の y 余裕（片側）。z/y が ASSUMED のため広めに取る
sd_clr_z  = 0.8;   // 逃し開口の z 余裕（片側）

// ===== 派生：内部キャビティ寸法（基板＋バッテリーの footprint 包絡） =====
// 頭合わせレイアウト: 頭(-X)は USB 突出 or バッテリー頭の手前、尾(+X)は
//   基板尾 or バッテリー尾の奥。中心は両者の包絡中心（基板中心ではない）。
foot_x0 = min(-usb_overhang, bat_x0);          // 頭側 端
foot_x1 = max(board_l, bat_x0 + bat_l);        // 尾側 端
foot_y0 = min(0, bat_y0);
foot_y1 = max(board_w, bat_y0 + bat_w);
cav_l = (foot_x1 - foot_x0) + 2 * clr;
cav_w = (foot_y1 - foot_y0) + 2 * clr;
// 内部はカメラ本体まで内包。レンズは天面壁を貫通させて外へ出す。
top_headroom = 1.0;   // 天井の追加余白(z)。実機で基板(カメラ最上部)が top と干渉して閉まらなかった補正。
                      //   レンズ突出量はこの分だけ減る（z_lens_top - (天井+wall) = 0.45mm 残り）
cav_h = (max(z_cam_top, z_usb_top) - z_bat_bot) + 2 * clr + top_headroom;

// キャビティ中心（footprint 包絡の中心）
cav_cx = (foot_x0 + foot_x1) / 2;
cav_cy = (foot_y0 + foot_y1) / 2;

// キャビティ外縁（リテンション／リップ／開口の配置基準）
cav_x0 = cav_cx - cav_l / 2;  cav_x1 = cav_cx + cav_l / 2;
cav_y0 = cav_cy - cav_w / 2;  cav_y1 = cav_cy + cav_w / 2;

// 描画解像度。プレビューは粗く、書き出し(clip.scad の export)で上げる。
$fn = $preview ? 32 : 96;
// main file
// envsense クリップ筐体 — 部品モック (Phase 1 / #2)
//
// dimensions.md の実測値で内蔵部品を簡易再現する。目的は 2 つ:
//   1) アセンブリ表示で干渉・配置を目視確認する
//   2) （将来）筐体キャビティを difference() で引くための「ネガ」にする
//
// 厳密な造形を狙わず、フィットチェックに必要な外形だけを箱・円柱で表す。
// 実機合わせで調整が要る箇所には TODO[実機] を付けてある。

include <params.scad>

// 角を丸めた角柱（垂直エッジのみ R、上下面はフラット）。基板外形に使う。
module rrect(l, w, h, r) {
    hull() {
        for (x = [r, l - r], y = [r, w - r])
            translate([x, y, 0]) cylinder(r = r, h = h);
    }
}

// ----- メイン基板 -----
module main_board() {
    color("DarkGreen")
        translate([0, 0, z_board_bot])
            rrect(board_l, board_w, pcb_t, corner_r);
}

// ----- USB-C コネクタ（上面 最高部品） -----
module usb_connector() {
    color("Silver")
        translate([-usb_overhang, board_w / 2 - usb_w / 2, z_board_top])
            cube([usb_overhang + usb_body_l, usb_w, usb_h]);
}

// ----- Sense 拡張ボード（メイン基板の下面に B2B 接続） -----
module sense_board() {
    color("DarkOliveGreen")
        translate([assy_offset[0], assy_offset[1], z_sense_bot])
            rrect(sense_l, sense_w, sense_t, corner_r);
}

// ----- OV2640 カメラ（拡張ボード下面側、レンズは -Z へ突き出す） -----
// TODO[実機]: fpc_l=8.7 と短いため、カメラは拡張ボードのすぐ脇に固定される。
//   ここでは cam_fpc_xy 近傍に置いているが、実機の固定位置で要調整。
module camera() {
    // 折り返し FPC で上面(+Z)に立つ。レンズは +Z（真上）へ。位置は §7 実測で確定。
    translate([cam_org[0], cam_org[1], cam_base_z])
        color("DimGray") rrect(cam_l, cam_w, cam_t, 0.5);
    // レンズホルダー（カメラ基板上面から +Z へ突き出す）
    color("Black")
        translate([lens_axis[0], lens_axis[1], z_cam_top])
            cylinder(d = lens_d, h = lens_h);
}

// ----- microSD カード（Sense 部品面(+Z)上のスロットに挿入。頭(-X)へ突き出す） -----
// 先端 x = -sd_protrude（実測 2.5）。z/y は ASSUMED（params.scad / dimensions.md §2）。
// 筐体側の逃しは enclosure.scad cut_sd（box）/ enclosure_pebble.scad cut_sd_peb（pebble）。
module sd_card() {
    color("Orange")
        translate([-sd_protrude, sd_y0, sd_z0])
            cube([sd_card_l, sd_card_w, sd_card_t]);
}

// ----- バッテリー（基板の下(-Z)に積層。頭合わせで尾(+X)へはみ出す） -----
module battery() {
    bx = bat_x0 + bat_off[0];
    by = bat_y0 + bat_off[1];
    color("SlateGray")
        translate([bx, by, z_bat_bot])
            cube([bat_l, bat_w, bat_t_fit]);
}

// ----- 全部品 -----
module device_assembly() {
    main_board();
    usb_connector();
    sense_board();
    camera();
    sd_card();
    battery();
}

// このファイルを単体で開いたときはアセンブリを表示
device_assembly();
